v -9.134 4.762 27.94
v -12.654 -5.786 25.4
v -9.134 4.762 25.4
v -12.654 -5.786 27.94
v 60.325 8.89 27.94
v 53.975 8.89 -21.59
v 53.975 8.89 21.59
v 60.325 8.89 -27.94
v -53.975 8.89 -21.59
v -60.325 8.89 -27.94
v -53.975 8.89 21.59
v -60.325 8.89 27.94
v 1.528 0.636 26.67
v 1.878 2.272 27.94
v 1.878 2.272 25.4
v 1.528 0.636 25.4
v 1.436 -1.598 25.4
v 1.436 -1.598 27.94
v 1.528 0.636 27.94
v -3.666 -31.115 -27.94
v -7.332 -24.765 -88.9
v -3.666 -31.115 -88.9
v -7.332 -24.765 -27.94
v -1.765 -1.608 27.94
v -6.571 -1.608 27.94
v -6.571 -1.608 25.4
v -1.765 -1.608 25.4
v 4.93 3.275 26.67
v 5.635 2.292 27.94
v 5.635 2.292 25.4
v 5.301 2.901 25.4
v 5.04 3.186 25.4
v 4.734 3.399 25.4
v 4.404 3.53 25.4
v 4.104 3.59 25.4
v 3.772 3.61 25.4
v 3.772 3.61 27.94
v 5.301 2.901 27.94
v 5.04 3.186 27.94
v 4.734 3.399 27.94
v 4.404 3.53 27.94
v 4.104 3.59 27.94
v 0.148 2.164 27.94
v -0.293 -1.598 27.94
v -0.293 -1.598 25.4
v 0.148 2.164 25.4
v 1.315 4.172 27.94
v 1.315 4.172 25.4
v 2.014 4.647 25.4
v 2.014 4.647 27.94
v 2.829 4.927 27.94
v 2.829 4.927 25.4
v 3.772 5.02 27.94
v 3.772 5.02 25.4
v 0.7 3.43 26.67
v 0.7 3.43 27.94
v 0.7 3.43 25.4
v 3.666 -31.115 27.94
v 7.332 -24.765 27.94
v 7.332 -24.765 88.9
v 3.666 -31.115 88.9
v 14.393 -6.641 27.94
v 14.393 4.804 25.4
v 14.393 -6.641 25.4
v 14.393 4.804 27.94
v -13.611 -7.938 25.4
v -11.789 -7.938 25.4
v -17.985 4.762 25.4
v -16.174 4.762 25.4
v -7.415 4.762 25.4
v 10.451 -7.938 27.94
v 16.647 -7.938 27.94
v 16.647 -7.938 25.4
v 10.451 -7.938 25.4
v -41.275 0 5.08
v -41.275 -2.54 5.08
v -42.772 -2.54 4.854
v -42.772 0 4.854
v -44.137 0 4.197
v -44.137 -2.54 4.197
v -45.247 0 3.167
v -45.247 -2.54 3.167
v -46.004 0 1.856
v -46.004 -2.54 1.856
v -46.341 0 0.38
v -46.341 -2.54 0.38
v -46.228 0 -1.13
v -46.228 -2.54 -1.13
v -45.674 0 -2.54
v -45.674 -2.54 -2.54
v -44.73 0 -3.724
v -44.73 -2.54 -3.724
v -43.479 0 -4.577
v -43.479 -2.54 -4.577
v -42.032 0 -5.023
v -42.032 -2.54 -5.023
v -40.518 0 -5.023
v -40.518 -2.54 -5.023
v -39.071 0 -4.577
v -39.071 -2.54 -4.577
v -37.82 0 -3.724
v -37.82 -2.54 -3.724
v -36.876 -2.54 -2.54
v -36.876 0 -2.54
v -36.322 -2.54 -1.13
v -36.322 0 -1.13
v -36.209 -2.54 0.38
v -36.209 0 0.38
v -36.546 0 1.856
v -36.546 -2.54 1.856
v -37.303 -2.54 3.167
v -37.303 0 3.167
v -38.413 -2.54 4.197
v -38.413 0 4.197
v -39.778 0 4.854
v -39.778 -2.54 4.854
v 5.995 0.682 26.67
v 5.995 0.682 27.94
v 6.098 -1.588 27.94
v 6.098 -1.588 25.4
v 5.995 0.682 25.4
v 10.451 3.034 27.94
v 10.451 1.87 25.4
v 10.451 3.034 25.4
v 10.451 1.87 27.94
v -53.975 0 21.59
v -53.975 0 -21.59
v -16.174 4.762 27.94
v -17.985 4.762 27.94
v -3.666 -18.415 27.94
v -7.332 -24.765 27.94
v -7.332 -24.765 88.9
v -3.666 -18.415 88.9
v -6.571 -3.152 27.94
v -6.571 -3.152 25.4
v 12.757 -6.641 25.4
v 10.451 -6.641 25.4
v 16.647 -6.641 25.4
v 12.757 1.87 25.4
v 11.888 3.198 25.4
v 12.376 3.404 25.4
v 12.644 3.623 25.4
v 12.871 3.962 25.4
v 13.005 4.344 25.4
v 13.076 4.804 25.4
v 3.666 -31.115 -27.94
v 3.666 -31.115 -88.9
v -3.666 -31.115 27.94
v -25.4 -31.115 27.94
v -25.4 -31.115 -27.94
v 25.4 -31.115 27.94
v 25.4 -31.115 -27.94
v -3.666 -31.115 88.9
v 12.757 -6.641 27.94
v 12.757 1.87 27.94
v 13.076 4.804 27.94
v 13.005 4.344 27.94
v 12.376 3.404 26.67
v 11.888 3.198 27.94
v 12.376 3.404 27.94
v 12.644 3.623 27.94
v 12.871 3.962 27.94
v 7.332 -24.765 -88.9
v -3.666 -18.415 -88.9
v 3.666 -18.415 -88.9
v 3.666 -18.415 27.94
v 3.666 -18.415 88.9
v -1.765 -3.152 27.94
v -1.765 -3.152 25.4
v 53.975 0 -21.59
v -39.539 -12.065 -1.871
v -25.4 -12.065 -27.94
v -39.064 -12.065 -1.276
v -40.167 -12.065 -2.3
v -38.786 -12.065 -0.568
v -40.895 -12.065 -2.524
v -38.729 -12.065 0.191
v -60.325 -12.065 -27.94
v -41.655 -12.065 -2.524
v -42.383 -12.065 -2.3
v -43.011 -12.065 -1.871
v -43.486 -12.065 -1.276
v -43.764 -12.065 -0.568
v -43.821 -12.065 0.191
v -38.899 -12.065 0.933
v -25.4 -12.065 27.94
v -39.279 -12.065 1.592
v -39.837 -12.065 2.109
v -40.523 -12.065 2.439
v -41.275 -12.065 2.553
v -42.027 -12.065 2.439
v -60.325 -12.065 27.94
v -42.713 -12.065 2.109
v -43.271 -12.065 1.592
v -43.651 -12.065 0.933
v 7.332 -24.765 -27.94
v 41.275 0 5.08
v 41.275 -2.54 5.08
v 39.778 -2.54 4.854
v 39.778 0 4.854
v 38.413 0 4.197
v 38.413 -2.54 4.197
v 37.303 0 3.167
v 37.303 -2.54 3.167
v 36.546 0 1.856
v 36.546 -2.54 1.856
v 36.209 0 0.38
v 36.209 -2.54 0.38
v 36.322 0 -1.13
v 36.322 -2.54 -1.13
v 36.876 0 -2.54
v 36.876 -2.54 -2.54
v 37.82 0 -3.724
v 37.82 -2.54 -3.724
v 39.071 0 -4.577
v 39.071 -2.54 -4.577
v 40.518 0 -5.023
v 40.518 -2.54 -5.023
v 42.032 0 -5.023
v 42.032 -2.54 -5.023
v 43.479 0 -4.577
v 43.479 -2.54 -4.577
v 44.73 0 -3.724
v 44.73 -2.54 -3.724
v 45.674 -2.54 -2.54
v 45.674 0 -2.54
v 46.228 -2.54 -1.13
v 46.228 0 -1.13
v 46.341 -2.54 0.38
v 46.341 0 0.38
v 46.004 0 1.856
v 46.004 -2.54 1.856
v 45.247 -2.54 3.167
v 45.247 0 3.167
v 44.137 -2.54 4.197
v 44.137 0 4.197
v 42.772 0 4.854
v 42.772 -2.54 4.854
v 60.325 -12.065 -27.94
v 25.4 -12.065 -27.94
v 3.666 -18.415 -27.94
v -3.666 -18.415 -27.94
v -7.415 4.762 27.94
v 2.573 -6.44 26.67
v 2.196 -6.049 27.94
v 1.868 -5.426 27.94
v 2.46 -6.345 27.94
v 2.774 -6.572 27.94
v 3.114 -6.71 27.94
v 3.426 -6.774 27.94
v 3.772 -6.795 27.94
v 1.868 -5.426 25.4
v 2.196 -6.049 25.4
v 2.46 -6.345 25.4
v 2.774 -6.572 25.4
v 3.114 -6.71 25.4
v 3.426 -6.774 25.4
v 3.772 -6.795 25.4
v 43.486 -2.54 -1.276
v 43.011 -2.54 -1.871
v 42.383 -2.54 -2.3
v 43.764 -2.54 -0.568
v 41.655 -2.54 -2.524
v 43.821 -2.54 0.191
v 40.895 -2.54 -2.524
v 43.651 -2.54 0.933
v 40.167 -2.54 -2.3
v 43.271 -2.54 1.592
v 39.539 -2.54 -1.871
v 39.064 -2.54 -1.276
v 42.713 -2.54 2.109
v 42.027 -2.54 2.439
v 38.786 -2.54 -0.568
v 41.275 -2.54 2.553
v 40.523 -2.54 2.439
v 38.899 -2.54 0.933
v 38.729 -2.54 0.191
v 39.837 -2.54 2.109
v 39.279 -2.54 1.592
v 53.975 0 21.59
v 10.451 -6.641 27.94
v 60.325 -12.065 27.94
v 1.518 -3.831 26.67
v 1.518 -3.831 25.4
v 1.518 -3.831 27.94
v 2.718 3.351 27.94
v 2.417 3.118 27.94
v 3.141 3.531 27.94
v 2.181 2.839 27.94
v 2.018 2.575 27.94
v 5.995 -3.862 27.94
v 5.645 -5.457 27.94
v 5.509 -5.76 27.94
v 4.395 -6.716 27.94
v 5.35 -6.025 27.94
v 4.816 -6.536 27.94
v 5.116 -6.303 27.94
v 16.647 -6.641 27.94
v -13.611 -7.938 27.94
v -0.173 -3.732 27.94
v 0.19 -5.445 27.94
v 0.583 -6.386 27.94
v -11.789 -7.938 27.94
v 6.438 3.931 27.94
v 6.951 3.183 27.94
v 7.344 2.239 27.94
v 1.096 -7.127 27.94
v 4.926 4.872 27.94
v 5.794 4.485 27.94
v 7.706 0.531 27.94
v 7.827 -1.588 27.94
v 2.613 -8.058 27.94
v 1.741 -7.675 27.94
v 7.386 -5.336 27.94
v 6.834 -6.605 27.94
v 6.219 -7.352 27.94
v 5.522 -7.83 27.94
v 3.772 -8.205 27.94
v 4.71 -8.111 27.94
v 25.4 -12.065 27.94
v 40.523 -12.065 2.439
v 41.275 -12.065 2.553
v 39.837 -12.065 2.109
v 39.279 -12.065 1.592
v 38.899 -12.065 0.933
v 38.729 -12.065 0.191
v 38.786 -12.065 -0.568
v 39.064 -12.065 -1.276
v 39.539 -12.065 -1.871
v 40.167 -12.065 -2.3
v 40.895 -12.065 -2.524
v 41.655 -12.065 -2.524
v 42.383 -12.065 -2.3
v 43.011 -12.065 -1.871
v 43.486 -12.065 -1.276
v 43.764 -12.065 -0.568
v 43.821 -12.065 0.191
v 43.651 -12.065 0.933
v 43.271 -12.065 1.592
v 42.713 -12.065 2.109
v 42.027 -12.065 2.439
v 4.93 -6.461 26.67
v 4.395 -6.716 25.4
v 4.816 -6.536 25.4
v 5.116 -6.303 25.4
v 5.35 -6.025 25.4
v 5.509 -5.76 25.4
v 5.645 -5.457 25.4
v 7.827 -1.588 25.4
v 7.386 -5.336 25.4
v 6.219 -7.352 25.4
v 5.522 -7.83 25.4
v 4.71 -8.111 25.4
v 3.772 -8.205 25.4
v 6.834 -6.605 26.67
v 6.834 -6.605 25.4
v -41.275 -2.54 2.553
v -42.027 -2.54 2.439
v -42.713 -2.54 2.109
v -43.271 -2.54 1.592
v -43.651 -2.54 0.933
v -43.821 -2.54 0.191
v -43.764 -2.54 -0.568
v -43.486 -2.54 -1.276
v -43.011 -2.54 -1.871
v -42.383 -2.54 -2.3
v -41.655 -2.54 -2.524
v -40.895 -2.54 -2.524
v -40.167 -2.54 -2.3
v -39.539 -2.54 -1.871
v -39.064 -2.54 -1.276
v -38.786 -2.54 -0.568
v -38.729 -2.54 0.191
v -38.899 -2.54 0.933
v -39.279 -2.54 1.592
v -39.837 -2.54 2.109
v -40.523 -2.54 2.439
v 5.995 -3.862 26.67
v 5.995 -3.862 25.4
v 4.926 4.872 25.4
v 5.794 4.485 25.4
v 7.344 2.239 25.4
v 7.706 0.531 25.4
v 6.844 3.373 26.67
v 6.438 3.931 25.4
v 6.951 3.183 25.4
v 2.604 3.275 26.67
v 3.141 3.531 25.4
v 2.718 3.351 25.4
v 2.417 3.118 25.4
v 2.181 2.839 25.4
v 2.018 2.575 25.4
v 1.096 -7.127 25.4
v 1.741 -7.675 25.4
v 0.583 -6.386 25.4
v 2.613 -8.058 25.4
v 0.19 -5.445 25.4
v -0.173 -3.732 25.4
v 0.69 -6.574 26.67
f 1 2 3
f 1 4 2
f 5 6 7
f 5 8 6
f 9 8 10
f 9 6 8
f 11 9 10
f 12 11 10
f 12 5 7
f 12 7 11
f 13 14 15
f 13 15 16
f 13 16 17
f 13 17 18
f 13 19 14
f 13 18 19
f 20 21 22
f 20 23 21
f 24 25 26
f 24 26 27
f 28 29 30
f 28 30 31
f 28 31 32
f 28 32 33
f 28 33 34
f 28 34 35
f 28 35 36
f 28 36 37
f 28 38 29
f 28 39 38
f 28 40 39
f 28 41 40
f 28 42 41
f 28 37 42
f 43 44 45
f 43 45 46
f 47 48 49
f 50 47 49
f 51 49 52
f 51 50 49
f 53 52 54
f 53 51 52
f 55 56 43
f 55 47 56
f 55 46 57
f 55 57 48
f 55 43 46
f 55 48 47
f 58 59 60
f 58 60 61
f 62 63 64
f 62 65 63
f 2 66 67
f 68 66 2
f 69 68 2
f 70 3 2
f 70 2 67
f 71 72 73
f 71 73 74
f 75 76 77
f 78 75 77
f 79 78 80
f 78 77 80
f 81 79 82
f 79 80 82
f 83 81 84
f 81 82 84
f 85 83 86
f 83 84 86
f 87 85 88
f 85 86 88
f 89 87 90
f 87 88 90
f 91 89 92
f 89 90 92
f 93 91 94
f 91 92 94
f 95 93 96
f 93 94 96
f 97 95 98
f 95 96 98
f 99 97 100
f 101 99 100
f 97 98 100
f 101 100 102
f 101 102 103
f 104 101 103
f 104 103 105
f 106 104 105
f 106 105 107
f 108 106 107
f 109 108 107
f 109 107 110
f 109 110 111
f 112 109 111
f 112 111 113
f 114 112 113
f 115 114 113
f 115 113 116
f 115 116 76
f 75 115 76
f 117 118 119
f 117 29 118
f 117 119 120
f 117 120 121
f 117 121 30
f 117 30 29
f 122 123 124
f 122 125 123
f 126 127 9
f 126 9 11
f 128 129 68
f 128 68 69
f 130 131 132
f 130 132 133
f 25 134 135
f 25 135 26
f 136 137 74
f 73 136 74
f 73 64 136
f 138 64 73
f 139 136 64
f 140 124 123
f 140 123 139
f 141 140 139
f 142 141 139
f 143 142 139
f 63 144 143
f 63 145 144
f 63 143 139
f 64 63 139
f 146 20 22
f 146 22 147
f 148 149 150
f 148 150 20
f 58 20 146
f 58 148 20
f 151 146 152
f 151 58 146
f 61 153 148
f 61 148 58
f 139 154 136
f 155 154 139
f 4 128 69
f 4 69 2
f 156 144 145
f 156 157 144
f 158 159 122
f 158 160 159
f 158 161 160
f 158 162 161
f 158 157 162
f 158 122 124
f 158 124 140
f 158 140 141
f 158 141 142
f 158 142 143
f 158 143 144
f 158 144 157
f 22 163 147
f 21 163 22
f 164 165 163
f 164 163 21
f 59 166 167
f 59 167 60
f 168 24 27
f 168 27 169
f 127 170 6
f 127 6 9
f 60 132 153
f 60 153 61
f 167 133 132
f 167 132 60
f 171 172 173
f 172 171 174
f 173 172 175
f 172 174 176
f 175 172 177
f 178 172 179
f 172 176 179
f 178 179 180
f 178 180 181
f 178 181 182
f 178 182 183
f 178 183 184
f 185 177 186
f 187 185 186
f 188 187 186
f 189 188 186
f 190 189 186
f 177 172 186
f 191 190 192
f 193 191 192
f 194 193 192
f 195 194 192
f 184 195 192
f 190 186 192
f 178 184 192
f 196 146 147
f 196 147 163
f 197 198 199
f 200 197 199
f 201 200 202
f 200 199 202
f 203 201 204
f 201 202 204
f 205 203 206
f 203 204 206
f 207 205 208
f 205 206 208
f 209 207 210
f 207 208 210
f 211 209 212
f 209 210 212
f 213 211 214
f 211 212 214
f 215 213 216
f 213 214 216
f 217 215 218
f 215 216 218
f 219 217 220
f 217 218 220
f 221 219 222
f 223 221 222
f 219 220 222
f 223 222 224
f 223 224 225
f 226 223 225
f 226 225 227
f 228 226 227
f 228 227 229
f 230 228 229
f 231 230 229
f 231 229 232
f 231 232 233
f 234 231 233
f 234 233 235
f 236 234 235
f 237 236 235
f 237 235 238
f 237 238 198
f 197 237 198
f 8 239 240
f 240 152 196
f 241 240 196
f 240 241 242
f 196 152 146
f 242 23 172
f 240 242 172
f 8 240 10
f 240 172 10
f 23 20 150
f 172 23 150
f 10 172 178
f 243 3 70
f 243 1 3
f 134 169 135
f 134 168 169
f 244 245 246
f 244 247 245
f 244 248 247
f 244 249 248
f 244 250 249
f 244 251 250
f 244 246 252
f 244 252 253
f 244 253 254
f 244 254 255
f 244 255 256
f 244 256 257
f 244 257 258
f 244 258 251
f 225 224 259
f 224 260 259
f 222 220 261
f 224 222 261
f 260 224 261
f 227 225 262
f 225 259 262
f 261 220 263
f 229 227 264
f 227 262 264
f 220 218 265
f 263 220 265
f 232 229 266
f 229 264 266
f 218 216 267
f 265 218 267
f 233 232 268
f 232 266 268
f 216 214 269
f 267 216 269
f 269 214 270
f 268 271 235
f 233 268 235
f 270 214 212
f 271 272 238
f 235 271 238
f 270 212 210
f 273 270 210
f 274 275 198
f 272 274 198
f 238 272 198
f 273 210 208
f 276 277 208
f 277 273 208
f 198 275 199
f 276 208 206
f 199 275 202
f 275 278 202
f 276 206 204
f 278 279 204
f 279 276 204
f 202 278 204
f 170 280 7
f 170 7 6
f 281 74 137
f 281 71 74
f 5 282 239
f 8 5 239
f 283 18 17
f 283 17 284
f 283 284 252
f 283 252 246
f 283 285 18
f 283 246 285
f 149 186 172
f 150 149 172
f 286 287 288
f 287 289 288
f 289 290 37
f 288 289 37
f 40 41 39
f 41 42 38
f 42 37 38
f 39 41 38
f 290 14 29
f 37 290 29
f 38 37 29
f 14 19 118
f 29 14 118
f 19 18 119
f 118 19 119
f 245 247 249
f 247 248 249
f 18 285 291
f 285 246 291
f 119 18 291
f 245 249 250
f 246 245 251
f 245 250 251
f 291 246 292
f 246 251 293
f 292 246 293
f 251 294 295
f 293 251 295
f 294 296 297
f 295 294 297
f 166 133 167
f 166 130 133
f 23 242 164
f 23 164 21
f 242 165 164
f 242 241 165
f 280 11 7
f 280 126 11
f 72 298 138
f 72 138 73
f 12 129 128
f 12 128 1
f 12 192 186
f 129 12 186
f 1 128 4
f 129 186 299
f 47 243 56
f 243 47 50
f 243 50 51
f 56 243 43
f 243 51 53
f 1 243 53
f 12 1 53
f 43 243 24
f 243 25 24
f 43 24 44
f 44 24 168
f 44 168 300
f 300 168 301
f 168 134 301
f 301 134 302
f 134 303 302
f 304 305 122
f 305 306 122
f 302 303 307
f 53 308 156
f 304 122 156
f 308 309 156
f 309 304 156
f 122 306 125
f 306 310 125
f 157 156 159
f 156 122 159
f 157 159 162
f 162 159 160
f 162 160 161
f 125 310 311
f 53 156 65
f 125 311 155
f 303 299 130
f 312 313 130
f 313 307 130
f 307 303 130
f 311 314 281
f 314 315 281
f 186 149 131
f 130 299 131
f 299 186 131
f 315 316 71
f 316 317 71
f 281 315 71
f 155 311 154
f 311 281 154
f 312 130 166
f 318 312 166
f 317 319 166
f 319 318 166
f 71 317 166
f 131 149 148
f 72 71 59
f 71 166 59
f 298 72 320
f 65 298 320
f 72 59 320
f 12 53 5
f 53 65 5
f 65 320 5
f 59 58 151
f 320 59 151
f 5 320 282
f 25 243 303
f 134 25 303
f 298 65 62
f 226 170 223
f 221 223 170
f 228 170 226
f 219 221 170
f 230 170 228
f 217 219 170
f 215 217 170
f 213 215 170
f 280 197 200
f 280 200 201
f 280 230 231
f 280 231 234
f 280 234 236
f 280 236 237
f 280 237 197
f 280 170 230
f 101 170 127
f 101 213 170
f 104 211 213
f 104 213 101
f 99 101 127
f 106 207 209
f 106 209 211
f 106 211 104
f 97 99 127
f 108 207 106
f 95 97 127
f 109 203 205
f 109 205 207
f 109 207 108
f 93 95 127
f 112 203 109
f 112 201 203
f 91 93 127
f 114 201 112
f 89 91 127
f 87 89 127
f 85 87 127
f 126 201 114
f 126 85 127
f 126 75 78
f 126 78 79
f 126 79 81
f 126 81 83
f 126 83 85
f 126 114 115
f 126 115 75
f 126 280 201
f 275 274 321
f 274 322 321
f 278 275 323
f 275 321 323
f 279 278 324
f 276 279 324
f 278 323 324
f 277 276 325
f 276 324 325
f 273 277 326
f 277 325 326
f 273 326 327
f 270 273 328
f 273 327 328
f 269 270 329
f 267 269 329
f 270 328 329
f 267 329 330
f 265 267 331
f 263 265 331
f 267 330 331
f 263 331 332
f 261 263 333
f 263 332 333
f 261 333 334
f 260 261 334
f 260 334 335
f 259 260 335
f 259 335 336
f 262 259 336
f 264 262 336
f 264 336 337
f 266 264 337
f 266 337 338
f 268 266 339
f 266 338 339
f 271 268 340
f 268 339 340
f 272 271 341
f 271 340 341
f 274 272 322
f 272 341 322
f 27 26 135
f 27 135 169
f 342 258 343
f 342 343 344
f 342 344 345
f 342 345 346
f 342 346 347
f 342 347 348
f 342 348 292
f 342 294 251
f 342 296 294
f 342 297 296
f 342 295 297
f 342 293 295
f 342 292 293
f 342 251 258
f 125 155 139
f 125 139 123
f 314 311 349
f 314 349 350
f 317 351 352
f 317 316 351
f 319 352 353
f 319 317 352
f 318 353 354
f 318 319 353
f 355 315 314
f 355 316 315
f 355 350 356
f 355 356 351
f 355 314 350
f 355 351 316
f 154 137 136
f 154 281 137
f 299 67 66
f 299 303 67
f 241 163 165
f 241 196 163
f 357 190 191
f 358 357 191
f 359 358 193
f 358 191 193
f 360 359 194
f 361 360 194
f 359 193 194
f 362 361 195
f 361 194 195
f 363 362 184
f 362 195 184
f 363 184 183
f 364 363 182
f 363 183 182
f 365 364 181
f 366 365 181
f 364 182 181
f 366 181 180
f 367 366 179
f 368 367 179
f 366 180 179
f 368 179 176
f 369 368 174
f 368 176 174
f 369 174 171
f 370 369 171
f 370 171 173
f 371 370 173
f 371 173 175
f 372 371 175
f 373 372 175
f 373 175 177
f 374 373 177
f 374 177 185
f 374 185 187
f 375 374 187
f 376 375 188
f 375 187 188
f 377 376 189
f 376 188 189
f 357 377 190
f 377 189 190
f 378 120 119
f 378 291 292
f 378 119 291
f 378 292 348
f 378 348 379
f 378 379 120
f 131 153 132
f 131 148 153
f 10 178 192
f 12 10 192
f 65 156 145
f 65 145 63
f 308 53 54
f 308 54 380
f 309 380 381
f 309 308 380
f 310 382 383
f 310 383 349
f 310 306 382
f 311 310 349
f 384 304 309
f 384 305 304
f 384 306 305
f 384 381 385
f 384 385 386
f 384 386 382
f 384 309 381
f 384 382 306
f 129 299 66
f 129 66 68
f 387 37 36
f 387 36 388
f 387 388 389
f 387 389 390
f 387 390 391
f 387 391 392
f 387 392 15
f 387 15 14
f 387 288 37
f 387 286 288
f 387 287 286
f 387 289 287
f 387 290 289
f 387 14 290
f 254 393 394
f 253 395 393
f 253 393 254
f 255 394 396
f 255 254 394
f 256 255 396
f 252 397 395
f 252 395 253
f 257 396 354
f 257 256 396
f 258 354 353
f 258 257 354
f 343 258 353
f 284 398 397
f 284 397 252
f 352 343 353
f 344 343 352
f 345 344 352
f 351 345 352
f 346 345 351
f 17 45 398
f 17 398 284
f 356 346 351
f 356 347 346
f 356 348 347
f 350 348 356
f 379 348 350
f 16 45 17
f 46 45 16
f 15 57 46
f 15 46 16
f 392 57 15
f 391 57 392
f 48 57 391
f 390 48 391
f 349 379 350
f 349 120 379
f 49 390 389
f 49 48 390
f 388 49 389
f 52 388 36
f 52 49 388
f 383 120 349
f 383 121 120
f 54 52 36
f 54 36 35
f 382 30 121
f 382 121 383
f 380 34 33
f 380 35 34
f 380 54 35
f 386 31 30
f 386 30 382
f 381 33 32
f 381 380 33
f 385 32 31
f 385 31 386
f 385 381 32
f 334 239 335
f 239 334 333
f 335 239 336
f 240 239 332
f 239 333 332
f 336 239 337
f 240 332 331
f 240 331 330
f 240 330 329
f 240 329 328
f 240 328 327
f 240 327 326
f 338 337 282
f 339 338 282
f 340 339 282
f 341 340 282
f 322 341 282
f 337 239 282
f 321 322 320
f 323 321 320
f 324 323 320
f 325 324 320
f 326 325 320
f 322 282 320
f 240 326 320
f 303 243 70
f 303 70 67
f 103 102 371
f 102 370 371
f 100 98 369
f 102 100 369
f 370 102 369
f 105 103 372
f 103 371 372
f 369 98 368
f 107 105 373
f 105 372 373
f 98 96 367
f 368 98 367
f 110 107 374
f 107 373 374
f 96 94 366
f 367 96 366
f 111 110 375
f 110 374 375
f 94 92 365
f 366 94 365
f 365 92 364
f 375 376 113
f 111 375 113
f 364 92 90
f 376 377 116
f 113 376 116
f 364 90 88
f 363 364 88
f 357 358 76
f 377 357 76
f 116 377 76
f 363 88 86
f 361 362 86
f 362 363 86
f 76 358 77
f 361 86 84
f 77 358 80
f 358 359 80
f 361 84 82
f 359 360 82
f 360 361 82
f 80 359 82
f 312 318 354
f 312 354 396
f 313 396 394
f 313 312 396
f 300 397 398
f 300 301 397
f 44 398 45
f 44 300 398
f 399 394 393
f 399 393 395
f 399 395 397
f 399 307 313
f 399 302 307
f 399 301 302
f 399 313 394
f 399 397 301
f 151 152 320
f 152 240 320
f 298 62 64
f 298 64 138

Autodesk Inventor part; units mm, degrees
ref_plane "YZ Plane" through (0, 0, 0) normal (1, 0, 0) x (0, 1, 0)
ref_plane "XZ Plane" through (0, 0, 0) normal (0, 1, 0) x (-1, 0, 0)
ref_plane "XY Plane" through (0, 0, 0) normal (0, 0, 1) x (1, 0, 0)
sketch "Sketch1" plane through (0, 0, 0) normal (0, 1, 0) x (-1, 0, 0)
  line L0 (53.975, 21.59) -> (-53.975, 21.59)
  line L1 (-53.975, 21.59) -> (-53.975, -21.59)
  line L2 (-53.975, -21.59) -> (53.975, -21.59)
  line L3 (53.975, -21.59) -> (53.975, 21.59)
  line L4 (53.975, 21.59) -> (-53.975, -21.59) construction
  line L5 (-53.975, 21.59) -> (53.975, -21.59) construction
  line L6 (60.325, 27.94) -> (-60.325, 27.94)
  line L7 (-60.325, 27.94) -> (-60.325, -27.94)
  line L8 (-60.325, -27.94) -> (60.325, -27.94)
  line L9 (60.325, -27.94) -> (60.325, 27.94)
  line L10 (60.325, 27.94) -> (-60.325, -27.94) construction
  line L11 (-60.325, 27.94) -> (60.325, -27.94) construction
  point P0 (0, 0)
  dimension "d0" = 43.18
  dimension "d1" = 107.95
  dimension "d2" = 6.35
  dimension "d3" = 6.35
extrude "Extrusion1" add sketch "Sketch1" against normal blind 12.065 contours L3 L2 L1 L0 | L9 L8 L7 L6
extrude "Extrusion2" add sketch "Sketch1" along normal blind 8.89
sketch "Sketch2" plane through (0, 0, 0) normal (0, 1, 0) x (1, 0, 0)
  line L0 (-53.975, 21.59) -> (-53.975, -21.59) construction
  line L1 (-53.975, 0) -> (53.975, 0) construction
  line L2 (53.975, -21.59) -> (53.975, 21.59) construction
  point P0 (0, 0)
  point P1 (-41.275, 0)
  point P2 (41.275, 0)
  dimension "d8" = 12.7
  dimension "d9" = 12.7
hole "Hole1" at (-41.275, 0, 0) at (41.275, 0, 0) direction (0, -1, 0) diameter 5.1054 end through all counterbore diameter 10.16 counterbore depth 2.54 clearance for "Hex Machine Screw" size "#10" standard "Ansi Unified Screw Threads"
sketch "Sketch5" plane through (0, -12.065, 0) normal (0, -1, 0) x (1, 0, 0)
  line L0 (-25.4, -27.94) -> (25.4, -27.94)
  line L1 (25.4, -27.94) -> (25.4, 27.94)
  line L2 (25.4, 27.94) -> (-25.4, 27.94)
  line L3 (-25.4, 27.94) -> (-25.4, -27.94)
  line L4 (-25.4, -27.94) -> (25.4, 27.94) construction
  line L5 (25.4, -27.94) -> (-25.4, 27.94) construction
  point P0 (0, 0)
  dimension "d27" = 50.8
  dimension "d28" = 55.88
extrude "Extrusion6" add sketch "Sketch5" along normal blind 19.05
sketch "Sketch11" plane through (-60.325, 8.89, 27.94) normal (0, 0, 1) x (1, 0, 0)
  line L0 (0, -20.955) -> (0, 0) construction
  line L1 (0, -10.4775) -> (120.65, -10.4775) construction
  line L2 (120.65, 0) -> (120.65, -20.955) construction
  line L3 (52.9098, -4.1275) -> (48.5358, -16.8275)
  line L4 (48.5358, -16.8275) -> (46.7142, -16.8275)
  line L5 (46.7142, -16.8275) -> (42.3402, -4.1275)
  line L6 (42.3402, -4.1275) -> (44.1515, -4.1275)
  line L7 (44.1515, -4.1275) -> (47.6713, -14.6765)
  line L8 (47.6713, -14.6765) -> (51.1911, -4.1275)
  line L9 (51.1911, -4.1275) -> (52.9098, -4.1275)
  line L10 (58.56, -12.0418) -> (53.7537, -12.0418)
  line L11 (53.7537, -12.0418) -> (53.7537, -10.4981)
  line L12 (53.7537, -10.4981) -> (58.56, -10.4981)
  line L13 (58.56, -10.4981) -> (58.56, -12.0418)
  spline S0 degree 2 poles (68.1519, -10.4775) (68.1519, -13.8944) (66.1656, -17.0951) (64.0969, -17.0951) knots 0 0 0 1 2 2 2
  spline S1 degree 2 poles (64.0969, -17.0951) (61.9974, -17.0951) (60.0317, -13.8326) (60.0317, -10.4878) knots 0 0 0 1 2 2 2
  spline S2 degree 2 poles (60.0317, -10.4878) (60.0317, -7.0504) (62.018, -3.8702) (64.0969, -3.8702) knots 0 0 0 1 2 2 2
  spline S3 degree 2 poles (64.0969, -3.8702) (66.1861, -3.8702) (68.1519, -7.1636) (68.1519, -10.4775) knots 0 0 0 1 2 2 2
  spline S4 degree 2 poles (65.97, -14.3472) (66.217, -13.7194) (66.4229, -11.7846) (66.4229, -10.4775) knots 0 0 0 1 2 2 2
  spline S5 degree 2 poles (66.4229, -10.4775) (66.4229, -9.1704) (66.217, -7.2459) (65.9597, -6.5975) knots 0 0 0 1 2 2 2
  spline S6 degree 2 poles (65.9597, -6.5975) (65.7024, -5.9491) (64.8071, -5.2802) (64.0969, -5.2802) knots 0 0 0 1 2 2 2
  spline S7 degree 2 poles (64.0969, -5.2802) (63.3868, -5.2802) (62.4708, -5.9491) (62.2032, -6.6181) knots 0 0 0 1 2 2 2
  spline S8 degree 2 poles (62.2032, -6.6181) (61.9459, -7.2665) (61.7607, -9.2425) (61.7607, -10.4878) knots 0 0 0 1 2 2 2
  spline S9 degree 2 poles (61.7607, -10.4878) (61.7607, -11.8257) (61.9254, -13.6165) (62.193, -14.3163) knots 0 0 0 1 2 2 2
  spline S10 degree 2 poles (62.193, -14.3163) (62.44, -14.975) (63.3559, -15.6851) (64.0969, -15.6851) knots 0 0 0 1 2 2 2
  spline S11 degree 2 poles (64.0969, -15.6851) (64.7968, -15.6851) (65.7127, -15.0162) (65.97, -14.3472) knots 0 0 0 1 2 2 2
  line L14 (76.9719, -16.8275) -> (70.7763, -16.8275)
  line L15 (70.7763, -16.8275) -> (70.7763, -15.5307)
  line L16 (70.7763, -15.5307) -> (73.0816, -15.5307)
  line L17 (73.0816, -15.5307) -> (73.0816, -7.0195)
  line L18 (73.0816, -7.0195) -> (70.7763, -7.0195)
  line L19 (70.7763, -7.0195) -> (70.7763, -5.8565)
  spline S12 degree 2 poles (70.7763, -5.8565) (72.0833, -5.8565) (73.3183, -5.1155) (73.4006, -4.0863) knots 0 0 0 1 2 2 2
  line L20 (73.4006, -4.0863) -> (74.718, -4.0863)
  line L21 (74.718, -4.0863) -> (74.718, -15.5307)
  line L22 (74.718, -15.5307) -> (76.9719, -15.5307)
  line L23 (76.9719, -15.5307) -> (76.9719, -16.8275)
  point P0 (60.325, -8.89)
extrude "Extrusion8" cut sketch "Sketch11" against normal blind 2.54
sketch "Sketch12" plane through (-60.325, 8.89, 27.94) normal (0, 0, 1) x (1, 0, 0)
  line L0 (85.725, -40.005) -> (34.925, -40.005) construction
  line L1 (60.325, -40.005) -> (60.325, -0.5585) construction
  line L2 (63.9912, -40.005) -> (56.6588, -40.005)
  line L3 (56.6588, -40.005) -> (52.9927, -33.655)
  line L4 (52.9927, -33.655) -> (56.6588, -27.305)
  line L5 (56.6588, -27.305) -> (63.9912, -27.305)
  line L6 (63.9912, -27.305) -> (67.6573, -33.655)
  line L7 (67.6573, -33.655) -> (63.9912, -40.005)
  point P0 (60.325, -8.89)
  point P1 (60.325, -33.655)
  dimension "d86" = 12.7
extrude "Extrusion9" add sketch "Sketch12" along normal blind 60.96
mirror "Mirror5" about plane through (0, 0, 0) normal (0, 0, 1) of "Extrusion9"
equation "\"d0\" = innerWidth"
equation "\"d1\" = innerLength"
equation "\"d2\" = wallThickness"
equation "\"d3\" = wallThickness"
equation "\"d4\" = bottomThickness"
equation "\"d6\" = innerDepth"
equation "\"d8\" = holeCenterFromInnerWall"
equation "\"d9\" = holeCenterFromInnerWall"
equation "\"d27\" = lowerPostLength"
equation "\"d28\" = lowerPostWidth"
equation "\"d29\" = lowerPostHeight"
equation "\"d86\" = hexSize"
equation "\"innerWidth\" = 43.18"
equation "\"innerLength\" = 107.95"
equation "\"innerDepth\" = 8.89"
equation "\"wallThickness\" = 6.35"
equation "\"postDiameter\" = 9.525"
equation "\"holeCenterFromInnerWall\" = 12.7"
equation "\"bottomThickness\" = 12.065"
equation "\"d17\" = postDiameter"
equation "\"exteriorWidth\" = innerWidth + 2 * wallThickness"
equation "\"exteriorLength\" = innerLength + 2 * wallThickness"
equation "\"exteriorHeight\" = innerDepth + bottomThickness"
equation "\"d24\" = postDiameter"
equation "\"lowerPostWidth\" = exteriorWidth"
equation "\"lowerPostLength\" = 50.8"
equation "\"lowerPostCenterX\" = 0.5 * exteriorLength"
equation "\"lowerPostHeight\" = 19.05"
equation "\"lowerPostCenterY\" = postDiameter"
equation "\"setScrewCenters\" = 0.333333 * exteriorWidth"
equation "\"hexSize\" = 12.7"
properties part number "connectorToTubeBracketWithOffsetHexShaft-V01" material "PBT Plastic"
